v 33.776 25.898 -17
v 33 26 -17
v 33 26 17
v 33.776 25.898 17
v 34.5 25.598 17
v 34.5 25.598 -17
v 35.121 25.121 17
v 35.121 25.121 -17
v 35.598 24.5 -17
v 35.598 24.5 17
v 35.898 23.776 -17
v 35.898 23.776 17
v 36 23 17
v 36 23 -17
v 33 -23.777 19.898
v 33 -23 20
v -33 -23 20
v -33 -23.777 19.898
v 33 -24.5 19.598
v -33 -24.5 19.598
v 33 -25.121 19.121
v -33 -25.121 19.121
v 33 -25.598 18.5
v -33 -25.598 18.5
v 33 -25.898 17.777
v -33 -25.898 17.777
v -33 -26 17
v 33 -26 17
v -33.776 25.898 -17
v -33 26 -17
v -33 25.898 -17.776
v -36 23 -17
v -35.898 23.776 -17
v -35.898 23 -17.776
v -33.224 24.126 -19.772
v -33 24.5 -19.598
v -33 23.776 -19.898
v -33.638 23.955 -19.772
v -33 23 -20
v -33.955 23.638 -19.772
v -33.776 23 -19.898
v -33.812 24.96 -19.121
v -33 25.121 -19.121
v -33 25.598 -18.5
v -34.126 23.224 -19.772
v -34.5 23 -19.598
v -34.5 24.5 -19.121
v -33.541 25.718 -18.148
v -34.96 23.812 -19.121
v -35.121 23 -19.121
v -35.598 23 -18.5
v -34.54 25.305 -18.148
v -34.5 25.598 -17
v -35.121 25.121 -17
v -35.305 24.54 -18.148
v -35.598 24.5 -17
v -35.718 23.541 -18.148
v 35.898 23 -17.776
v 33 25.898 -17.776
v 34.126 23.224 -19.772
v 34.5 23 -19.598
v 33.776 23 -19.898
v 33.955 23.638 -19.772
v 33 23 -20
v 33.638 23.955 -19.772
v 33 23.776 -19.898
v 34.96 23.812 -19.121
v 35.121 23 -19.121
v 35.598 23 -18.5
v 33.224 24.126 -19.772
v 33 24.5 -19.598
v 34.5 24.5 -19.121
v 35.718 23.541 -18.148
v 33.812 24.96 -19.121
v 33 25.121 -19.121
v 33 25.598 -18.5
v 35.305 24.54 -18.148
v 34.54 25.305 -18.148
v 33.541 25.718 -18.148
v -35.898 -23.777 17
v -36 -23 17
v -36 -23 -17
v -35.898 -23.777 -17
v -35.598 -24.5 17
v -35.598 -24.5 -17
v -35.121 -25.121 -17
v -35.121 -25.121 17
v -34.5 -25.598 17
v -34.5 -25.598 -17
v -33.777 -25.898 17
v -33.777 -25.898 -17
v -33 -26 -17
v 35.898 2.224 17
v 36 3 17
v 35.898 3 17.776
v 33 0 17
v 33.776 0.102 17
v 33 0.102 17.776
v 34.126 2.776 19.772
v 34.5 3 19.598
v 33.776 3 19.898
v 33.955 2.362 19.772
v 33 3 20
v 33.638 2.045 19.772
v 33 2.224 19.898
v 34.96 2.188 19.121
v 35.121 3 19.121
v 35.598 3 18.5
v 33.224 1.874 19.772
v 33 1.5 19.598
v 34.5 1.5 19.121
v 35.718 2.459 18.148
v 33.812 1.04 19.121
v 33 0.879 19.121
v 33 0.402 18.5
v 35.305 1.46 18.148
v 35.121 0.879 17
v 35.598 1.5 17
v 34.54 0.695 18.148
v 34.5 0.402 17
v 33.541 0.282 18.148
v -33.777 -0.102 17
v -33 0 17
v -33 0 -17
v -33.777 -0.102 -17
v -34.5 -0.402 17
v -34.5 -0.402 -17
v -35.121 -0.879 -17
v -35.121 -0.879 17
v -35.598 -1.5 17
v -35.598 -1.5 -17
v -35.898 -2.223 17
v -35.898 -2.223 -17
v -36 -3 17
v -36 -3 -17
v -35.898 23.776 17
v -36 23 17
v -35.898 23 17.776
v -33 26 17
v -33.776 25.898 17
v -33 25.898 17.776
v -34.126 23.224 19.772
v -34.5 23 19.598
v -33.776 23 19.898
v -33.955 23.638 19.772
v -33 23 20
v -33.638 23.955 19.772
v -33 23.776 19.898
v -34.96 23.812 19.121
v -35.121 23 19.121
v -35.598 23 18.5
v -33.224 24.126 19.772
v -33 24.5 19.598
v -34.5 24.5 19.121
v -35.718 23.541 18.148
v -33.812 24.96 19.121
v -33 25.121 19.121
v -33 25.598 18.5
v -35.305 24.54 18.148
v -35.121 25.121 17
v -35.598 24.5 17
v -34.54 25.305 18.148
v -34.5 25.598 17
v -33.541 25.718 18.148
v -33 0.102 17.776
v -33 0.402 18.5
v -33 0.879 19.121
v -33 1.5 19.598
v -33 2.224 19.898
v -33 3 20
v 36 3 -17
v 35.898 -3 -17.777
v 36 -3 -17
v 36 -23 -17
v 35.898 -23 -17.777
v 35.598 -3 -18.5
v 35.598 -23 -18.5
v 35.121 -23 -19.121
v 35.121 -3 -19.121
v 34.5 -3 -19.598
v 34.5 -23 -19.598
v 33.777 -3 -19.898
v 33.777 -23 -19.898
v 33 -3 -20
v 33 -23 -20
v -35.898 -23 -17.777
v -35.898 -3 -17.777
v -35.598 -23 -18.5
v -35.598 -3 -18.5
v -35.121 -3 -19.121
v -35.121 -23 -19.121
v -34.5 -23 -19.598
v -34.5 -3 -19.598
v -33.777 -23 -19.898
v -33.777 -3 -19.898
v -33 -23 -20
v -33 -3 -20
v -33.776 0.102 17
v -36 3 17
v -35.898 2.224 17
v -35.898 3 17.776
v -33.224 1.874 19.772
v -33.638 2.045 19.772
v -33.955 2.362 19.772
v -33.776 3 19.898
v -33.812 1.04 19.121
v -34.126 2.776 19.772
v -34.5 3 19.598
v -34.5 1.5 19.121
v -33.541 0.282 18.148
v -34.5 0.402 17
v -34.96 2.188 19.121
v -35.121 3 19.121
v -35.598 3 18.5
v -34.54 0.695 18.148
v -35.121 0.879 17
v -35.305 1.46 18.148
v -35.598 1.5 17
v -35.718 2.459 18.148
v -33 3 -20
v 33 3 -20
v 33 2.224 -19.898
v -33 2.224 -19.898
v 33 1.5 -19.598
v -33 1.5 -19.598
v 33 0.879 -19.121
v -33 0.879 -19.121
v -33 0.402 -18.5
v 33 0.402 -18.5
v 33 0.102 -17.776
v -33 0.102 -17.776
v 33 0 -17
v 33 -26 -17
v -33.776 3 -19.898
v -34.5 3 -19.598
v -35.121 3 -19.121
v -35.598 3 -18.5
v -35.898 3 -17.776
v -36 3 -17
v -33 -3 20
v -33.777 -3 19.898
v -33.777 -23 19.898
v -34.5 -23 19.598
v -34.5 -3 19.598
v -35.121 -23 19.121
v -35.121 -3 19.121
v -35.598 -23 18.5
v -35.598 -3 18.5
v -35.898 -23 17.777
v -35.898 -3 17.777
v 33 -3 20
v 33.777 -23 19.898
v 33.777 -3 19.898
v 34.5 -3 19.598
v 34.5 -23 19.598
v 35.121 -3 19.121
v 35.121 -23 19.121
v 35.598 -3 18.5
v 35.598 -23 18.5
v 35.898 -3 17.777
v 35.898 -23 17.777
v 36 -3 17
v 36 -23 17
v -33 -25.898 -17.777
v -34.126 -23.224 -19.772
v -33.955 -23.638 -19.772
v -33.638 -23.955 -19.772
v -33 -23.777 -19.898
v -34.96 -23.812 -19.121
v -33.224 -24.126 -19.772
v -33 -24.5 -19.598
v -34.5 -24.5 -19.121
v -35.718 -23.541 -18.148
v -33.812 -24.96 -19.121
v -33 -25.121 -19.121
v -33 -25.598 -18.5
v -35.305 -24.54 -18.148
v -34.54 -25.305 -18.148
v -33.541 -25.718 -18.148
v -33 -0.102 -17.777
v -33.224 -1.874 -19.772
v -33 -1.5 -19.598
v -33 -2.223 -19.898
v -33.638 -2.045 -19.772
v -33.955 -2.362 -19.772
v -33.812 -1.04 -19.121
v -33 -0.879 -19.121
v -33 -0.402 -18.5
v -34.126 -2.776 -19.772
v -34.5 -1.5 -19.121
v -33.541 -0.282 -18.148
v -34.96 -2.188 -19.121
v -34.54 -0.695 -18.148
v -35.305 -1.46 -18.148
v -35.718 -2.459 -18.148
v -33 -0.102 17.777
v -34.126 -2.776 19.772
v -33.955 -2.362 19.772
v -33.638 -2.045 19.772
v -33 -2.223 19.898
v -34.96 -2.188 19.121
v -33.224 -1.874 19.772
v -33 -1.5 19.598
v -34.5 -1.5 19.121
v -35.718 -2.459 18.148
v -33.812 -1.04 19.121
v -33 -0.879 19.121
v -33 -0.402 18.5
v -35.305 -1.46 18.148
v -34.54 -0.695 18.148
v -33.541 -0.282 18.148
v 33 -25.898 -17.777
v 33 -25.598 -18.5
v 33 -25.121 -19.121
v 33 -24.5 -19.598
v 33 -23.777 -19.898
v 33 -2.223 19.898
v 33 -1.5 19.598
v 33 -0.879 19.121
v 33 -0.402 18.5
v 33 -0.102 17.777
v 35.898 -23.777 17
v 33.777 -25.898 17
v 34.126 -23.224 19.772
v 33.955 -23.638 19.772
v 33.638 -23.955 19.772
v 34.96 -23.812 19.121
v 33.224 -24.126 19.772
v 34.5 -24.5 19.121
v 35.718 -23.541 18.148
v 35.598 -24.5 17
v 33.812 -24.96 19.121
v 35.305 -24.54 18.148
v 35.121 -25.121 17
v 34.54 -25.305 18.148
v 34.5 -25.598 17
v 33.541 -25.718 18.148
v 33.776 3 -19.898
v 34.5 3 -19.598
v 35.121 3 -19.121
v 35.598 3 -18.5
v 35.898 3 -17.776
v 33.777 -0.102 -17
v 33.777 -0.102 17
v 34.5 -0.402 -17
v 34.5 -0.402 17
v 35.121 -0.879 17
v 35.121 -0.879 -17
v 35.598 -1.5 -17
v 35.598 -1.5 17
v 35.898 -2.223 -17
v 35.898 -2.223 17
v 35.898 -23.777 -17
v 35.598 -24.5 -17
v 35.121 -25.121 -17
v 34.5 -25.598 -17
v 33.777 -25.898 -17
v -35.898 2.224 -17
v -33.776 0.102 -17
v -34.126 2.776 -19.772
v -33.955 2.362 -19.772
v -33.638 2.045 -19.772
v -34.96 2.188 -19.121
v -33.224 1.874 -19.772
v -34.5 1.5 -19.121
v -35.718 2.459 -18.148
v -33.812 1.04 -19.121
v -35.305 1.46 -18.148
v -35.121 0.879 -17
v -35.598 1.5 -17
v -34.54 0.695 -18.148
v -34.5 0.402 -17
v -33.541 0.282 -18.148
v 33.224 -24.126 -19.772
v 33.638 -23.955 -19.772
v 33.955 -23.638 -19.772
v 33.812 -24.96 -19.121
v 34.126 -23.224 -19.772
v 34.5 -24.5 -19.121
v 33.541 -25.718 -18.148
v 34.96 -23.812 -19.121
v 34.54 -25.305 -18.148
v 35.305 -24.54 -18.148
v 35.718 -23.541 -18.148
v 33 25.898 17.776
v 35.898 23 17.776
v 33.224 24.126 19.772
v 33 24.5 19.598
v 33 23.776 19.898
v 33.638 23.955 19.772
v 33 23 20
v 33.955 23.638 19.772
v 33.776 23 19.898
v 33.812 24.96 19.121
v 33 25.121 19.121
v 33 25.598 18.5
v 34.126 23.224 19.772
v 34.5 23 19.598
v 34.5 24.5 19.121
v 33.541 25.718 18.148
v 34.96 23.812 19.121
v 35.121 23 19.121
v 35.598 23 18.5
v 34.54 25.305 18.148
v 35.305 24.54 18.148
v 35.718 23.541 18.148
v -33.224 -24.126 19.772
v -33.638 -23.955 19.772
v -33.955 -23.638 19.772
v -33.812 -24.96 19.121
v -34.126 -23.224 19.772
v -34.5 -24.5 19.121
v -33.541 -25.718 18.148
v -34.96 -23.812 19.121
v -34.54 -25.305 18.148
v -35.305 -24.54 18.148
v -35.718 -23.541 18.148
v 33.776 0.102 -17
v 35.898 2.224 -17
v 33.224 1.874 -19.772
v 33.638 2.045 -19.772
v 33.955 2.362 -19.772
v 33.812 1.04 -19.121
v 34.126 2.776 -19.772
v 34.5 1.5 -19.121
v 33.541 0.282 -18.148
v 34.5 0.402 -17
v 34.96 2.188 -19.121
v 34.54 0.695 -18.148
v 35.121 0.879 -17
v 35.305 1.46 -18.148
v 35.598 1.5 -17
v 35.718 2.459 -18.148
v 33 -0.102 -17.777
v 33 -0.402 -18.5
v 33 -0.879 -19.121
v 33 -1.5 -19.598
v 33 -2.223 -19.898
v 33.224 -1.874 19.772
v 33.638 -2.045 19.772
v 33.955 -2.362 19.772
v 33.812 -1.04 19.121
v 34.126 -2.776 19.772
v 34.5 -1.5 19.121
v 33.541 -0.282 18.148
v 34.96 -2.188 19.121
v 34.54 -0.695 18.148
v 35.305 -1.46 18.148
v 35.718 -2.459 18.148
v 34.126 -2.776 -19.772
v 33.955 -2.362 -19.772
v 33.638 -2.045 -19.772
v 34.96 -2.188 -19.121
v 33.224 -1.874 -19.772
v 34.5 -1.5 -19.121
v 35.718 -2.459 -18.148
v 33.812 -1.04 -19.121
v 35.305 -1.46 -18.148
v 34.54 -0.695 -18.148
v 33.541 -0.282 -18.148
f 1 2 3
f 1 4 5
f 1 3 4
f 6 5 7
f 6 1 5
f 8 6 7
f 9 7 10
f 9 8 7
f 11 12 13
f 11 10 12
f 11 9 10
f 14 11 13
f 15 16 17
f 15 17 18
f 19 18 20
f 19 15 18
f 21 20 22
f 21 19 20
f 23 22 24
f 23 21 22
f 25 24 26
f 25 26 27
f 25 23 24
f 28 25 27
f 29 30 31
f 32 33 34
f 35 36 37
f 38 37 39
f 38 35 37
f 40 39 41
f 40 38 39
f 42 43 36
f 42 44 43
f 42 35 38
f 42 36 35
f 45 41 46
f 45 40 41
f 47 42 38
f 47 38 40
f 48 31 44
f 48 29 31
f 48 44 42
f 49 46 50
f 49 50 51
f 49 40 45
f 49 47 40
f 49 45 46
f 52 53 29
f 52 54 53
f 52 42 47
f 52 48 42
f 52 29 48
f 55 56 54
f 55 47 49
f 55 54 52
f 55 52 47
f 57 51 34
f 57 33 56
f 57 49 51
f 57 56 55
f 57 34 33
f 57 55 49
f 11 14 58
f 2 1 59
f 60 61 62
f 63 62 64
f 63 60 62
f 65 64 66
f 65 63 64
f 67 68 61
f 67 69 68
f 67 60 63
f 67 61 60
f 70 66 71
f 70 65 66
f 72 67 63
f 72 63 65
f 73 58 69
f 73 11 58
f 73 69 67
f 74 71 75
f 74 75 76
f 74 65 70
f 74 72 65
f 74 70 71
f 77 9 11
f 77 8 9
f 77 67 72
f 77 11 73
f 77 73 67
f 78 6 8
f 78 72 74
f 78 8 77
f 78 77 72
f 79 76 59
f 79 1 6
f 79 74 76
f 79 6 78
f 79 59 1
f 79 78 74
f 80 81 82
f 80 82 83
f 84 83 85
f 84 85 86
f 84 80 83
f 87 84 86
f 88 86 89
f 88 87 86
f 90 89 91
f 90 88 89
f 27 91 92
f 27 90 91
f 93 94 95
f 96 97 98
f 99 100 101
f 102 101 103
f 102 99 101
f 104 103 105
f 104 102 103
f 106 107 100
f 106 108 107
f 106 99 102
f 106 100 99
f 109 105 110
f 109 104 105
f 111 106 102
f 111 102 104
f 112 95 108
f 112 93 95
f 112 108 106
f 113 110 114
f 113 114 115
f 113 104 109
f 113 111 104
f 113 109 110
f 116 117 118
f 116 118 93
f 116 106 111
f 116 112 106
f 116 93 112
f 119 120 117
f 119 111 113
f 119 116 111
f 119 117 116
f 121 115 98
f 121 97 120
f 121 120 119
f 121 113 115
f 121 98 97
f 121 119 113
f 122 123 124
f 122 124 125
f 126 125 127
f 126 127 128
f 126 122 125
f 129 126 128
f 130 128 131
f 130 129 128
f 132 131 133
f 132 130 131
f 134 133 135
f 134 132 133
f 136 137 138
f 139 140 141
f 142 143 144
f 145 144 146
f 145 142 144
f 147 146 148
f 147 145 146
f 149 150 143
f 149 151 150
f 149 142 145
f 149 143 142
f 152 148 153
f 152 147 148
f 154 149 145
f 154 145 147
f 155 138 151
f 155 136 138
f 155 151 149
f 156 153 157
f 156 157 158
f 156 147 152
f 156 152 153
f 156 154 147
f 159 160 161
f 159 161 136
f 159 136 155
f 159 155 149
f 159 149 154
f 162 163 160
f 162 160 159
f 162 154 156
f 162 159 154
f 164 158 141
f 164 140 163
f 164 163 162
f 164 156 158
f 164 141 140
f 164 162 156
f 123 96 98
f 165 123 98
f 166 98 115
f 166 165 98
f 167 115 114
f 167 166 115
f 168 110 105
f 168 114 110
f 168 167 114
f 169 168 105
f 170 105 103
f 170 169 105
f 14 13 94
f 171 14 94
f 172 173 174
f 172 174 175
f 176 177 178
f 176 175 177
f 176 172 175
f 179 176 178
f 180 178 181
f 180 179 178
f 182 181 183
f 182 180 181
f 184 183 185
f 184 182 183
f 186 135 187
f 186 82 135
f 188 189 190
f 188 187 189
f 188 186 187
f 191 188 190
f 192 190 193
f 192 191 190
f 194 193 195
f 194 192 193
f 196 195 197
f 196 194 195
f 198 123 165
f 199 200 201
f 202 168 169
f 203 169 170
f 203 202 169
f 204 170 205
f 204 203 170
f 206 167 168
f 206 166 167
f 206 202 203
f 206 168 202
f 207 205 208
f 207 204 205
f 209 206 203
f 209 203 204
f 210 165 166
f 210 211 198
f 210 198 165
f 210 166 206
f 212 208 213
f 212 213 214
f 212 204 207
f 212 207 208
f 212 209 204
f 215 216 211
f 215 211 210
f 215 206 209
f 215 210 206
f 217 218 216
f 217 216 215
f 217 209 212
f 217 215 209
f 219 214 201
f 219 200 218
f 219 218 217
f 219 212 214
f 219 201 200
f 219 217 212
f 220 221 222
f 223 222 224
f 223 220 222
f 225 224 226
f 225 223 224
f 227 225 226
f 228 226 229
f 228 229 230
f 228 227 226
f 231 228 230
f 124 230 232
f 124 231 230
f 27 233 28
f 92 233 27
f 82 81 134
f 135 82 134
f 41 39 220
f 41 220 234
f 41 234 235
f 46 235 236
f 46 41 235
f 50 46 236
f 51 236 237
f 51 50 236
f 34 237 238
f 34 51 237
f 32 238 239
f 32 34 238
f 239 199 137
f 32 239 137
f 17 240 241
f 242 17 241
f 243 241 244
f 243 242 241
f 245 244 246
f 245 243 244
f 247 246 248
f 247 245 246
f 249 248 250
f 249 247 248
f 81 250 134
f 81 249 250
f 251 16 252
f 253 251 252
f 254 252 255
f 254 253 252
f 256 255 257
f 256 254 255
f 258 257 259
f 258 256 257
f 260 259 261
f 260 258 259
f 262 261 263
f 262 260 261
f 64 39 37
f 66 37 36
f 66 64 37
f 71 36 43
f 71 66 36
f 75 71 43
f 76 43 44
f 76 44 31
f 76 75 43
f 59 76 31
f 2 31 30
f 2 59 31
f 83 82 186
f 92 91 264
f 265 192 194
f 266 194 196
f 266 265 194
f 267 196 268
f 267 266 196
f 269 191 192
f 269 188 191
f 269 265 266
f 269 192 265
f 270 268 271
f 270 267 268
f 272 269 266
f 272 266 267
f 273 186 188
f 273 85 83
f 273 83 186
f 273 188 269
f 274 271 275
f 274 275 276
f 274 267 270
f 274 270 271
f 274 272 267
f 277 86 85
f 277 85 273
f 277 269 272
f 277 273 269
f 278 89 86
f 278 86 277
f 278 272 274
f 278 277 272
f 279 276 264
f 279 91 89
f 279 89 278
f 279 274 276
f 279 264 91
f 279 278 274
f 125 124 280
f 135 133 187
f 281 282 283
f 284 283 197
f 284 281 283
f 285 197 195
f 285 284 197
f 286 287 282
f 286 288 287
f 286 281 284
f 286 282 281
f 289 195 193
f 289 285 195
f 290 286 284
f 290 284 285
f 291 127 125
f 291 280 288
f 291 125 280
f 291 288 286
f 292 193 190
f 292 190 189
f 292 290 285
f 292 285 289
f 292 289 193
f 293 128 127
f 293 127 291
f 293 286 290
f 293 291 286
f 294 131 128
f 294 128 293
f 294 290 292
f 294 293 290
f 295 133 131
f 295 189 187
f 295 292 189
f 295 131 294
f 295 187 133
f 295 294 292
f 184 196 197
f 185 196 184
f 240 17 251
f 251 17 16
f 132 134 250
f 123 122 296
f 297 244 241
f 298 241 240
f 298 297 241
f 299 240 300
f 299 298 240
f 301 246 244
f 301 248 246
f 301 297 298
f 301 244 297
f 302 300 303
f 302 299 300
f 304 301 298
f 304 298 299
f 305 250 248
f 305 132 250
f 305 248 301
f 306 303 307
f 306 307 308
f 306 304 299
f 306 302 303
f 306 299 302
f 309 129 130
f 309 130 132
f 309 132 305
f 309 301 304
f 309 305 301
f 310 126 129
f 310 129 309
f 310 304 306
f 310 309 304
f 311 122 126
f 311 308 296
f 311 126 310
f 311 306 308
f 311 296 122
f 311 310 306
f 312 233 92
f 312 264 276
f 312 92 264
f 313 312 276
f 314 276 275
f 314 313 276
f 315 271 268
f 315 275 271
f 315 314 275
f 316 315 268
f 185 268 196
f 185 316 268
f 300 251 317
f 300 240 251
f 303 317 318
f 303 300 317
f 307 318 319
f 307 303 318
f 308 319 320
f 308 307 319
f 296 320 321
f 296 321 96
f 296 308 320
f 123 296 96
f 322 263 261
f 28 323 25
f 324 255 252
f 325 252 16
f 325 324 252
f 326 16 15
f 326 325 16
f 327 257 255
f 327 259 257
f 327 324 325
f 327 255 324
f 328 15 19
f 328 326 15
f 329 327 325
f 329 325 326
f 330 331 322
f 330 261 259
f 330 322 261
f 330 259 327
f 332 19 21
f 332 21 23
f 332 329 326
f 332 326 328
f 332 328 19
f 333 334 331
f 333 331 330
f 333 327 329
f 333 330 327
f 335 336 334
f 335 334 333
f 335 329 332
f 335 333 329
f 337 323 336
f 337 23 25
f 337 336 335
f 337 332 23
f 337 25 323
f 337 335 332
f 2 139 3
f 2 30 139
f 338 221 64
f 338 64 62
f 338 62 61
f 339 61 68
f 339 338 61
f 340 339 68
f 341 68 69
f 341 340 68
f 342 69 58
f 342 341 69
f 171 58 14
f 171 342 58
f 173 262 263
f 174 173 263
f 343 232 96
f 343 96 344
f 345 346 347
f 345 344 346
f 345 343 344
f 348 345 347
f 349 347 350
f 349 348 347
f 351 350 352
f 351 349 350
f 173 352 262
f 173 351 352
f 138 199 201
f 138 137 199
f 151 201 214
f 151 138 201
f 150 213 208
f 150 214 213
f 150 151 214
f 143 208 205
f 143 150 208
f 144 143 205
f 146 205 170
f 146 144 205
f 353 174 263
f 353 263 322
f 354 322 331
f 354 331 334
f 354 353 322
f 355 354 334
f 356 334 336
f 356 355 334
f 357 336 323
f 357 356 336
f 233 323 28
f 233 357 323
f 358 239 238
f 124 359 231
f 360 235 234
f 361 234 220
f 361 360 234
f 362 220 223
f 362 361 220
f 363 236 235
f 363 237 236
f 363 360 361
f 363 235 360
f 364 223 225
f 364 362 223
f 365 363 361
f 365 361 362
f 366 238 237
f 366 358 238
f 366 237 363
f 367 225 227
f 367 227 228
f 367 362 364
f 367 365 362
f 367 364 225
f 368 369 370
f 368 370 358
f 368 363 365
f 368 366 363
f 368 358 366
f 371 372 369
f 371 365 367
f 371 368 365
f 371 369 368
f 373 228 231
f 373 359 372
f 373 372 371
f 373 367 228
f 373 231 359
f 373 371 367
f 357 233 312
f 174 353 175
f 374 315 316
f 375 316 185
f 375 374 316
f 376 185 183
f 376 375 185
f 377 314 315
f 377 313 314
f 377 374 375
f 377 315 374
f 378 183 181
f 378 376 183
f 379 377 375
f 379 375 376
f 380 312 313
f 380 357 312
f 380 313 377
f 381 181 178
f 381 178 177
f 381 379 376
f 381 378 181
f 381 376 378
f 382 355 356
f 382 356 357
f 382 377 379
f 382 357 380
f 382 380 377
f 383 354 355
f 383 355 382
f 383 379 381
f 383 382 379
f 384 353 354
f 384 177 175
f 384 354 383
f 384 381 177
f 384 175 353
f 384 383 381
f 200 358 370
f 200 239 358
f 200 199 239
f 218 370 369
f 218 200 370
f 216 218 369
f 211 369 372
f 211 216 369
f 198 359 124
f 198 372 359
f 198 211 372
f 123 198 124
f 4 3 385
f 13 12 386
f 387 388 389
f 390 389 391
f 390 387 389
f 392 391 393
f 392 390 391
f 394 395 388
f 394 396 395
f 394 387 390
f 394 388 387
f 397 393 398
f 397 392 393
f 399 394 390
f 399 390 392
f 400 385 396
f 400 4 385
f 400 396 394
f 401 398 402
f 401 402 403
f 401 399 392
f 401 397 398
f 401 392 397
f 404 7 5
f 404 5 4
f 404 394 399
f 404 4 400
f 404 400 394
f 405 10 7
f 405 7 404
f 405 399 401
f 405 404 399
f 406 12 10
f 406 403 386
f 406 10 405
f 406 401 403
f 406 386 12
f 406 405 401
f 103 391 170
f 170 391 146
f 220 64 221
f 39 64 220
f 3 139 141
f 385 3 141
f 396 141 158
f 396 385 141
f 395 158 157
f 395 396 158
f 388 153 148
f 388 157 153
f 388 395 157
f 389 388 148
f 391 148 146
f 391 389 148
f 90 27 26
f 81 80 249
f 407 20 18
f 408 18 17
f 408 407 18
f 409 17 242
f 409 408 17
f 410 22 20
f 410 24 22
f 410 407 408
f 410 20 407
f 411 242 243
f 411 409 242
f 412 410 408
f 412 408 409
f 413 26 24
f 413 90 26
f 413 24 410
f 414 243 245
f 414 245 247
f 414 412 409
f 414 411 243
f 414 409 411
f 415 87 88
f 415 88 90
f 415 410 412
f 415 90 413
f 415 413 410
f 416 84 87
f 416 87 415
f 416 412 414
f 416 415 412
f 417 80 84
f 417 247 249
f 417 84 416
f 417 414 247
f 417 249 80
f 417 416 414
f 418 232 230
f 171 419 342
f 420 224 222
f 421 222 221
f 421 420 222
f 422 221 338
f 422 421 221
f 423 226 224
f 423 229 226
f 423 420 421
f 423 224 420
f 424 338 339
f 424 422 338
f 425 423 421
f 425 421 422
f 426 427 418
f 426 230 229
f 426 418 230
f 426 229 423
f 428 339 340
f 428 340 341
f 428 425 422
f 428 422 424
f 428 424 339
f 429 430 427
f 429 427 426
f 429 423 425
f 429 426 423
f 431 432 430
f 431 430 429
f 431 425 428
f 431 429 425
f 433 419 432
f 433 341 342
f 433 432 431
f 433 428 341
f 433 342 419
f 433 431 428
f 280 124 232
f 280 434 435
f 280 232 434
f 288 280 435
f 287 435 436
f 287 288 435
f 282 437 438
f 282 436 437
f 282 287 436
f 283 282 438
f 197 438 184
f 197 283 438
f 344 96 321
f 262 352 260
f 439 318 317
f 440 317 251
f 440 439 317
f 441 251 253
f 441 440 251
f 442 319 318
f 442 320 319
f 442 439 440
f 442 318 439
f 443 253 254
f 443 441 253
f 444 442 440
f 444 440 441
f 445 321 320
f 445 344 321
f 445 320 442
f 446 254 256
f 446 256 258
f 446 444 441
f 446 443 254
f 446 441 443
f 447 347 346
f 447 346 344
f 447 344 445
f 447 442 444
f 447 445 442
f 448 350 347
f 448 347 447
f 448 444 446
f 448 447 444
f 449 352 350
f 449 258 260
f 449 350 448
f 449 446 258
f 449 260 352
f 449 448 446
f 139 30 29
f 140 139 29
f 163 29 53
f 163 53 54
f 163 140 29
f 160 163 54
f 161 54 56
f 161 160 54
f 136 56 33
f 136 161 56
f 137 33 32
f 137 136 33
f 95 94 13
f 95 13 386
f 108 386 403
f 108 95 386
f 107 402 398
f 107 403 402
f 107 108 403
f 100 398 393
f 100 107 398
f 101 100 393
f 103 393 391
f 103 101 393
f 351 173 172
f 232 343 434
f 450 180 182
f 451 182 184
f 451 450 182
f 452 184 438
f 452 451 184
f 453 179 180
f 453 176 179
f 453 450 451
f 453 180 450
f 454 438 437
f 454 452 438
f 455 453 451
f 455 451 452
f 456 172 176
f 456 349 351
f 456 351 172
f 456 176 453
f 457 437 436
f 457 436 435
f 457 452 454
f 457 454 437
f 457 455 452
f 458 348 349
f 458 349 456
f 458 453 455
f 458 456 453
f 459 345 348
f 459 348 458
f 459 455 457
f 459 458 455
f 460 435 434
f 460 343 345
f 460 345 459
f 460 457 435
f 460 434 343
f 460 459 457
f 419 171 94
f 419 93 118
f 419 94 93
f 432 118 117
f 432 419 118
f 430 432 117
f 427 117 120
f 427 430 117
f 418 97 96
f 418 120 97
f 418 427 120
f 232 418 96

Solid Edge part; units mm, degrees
sketch "Sketch1" plane through (0, 0, 0) normal (0, 0, 1) x (1, 0, 0)
  line L0 (-36, 26) -> (36, 26)
  line L1 (36, 26) -> (36, 0)
  line L2 (36, 0) -> (-36, 0)
  line L3 (-36, 0) -> (-36, 26)
  dimension "D1" = 26
  dimension "D2" = 72
extrude "Protrusion1" add sketch "Sketch1" along normal mid plane 40
fillet "cell_rounds" radius 3 12 edges at (-36, 26, 0) (36, 26, 0) (36, 0, 0) (-36, 0, 0) (0, 0, 20) (36, 13, 20) (0, 26, 20) (-36, 13, 20) (0, 0, -20) (36, 13, -20) (0, 26, -20) (-36, 13, -20)
mirror "Mirror1" about plane through (0, 0, 0) normal (0, -1, 0) of "Protrusion1"
fillet "Round1" radius 3 12 edges at (-36, -26, 0) (-36, 0, 0) (36, 0, 0) (36, -26, 0) (36, -13, 20) (0, 0, 20) (-36, -13, 20) (0, -26, 20) (36, -13, -20) (0, 0, -20) (-36, -13, -20) (0, -26, -20)
properties material "ABS Plastic, medium impact"
